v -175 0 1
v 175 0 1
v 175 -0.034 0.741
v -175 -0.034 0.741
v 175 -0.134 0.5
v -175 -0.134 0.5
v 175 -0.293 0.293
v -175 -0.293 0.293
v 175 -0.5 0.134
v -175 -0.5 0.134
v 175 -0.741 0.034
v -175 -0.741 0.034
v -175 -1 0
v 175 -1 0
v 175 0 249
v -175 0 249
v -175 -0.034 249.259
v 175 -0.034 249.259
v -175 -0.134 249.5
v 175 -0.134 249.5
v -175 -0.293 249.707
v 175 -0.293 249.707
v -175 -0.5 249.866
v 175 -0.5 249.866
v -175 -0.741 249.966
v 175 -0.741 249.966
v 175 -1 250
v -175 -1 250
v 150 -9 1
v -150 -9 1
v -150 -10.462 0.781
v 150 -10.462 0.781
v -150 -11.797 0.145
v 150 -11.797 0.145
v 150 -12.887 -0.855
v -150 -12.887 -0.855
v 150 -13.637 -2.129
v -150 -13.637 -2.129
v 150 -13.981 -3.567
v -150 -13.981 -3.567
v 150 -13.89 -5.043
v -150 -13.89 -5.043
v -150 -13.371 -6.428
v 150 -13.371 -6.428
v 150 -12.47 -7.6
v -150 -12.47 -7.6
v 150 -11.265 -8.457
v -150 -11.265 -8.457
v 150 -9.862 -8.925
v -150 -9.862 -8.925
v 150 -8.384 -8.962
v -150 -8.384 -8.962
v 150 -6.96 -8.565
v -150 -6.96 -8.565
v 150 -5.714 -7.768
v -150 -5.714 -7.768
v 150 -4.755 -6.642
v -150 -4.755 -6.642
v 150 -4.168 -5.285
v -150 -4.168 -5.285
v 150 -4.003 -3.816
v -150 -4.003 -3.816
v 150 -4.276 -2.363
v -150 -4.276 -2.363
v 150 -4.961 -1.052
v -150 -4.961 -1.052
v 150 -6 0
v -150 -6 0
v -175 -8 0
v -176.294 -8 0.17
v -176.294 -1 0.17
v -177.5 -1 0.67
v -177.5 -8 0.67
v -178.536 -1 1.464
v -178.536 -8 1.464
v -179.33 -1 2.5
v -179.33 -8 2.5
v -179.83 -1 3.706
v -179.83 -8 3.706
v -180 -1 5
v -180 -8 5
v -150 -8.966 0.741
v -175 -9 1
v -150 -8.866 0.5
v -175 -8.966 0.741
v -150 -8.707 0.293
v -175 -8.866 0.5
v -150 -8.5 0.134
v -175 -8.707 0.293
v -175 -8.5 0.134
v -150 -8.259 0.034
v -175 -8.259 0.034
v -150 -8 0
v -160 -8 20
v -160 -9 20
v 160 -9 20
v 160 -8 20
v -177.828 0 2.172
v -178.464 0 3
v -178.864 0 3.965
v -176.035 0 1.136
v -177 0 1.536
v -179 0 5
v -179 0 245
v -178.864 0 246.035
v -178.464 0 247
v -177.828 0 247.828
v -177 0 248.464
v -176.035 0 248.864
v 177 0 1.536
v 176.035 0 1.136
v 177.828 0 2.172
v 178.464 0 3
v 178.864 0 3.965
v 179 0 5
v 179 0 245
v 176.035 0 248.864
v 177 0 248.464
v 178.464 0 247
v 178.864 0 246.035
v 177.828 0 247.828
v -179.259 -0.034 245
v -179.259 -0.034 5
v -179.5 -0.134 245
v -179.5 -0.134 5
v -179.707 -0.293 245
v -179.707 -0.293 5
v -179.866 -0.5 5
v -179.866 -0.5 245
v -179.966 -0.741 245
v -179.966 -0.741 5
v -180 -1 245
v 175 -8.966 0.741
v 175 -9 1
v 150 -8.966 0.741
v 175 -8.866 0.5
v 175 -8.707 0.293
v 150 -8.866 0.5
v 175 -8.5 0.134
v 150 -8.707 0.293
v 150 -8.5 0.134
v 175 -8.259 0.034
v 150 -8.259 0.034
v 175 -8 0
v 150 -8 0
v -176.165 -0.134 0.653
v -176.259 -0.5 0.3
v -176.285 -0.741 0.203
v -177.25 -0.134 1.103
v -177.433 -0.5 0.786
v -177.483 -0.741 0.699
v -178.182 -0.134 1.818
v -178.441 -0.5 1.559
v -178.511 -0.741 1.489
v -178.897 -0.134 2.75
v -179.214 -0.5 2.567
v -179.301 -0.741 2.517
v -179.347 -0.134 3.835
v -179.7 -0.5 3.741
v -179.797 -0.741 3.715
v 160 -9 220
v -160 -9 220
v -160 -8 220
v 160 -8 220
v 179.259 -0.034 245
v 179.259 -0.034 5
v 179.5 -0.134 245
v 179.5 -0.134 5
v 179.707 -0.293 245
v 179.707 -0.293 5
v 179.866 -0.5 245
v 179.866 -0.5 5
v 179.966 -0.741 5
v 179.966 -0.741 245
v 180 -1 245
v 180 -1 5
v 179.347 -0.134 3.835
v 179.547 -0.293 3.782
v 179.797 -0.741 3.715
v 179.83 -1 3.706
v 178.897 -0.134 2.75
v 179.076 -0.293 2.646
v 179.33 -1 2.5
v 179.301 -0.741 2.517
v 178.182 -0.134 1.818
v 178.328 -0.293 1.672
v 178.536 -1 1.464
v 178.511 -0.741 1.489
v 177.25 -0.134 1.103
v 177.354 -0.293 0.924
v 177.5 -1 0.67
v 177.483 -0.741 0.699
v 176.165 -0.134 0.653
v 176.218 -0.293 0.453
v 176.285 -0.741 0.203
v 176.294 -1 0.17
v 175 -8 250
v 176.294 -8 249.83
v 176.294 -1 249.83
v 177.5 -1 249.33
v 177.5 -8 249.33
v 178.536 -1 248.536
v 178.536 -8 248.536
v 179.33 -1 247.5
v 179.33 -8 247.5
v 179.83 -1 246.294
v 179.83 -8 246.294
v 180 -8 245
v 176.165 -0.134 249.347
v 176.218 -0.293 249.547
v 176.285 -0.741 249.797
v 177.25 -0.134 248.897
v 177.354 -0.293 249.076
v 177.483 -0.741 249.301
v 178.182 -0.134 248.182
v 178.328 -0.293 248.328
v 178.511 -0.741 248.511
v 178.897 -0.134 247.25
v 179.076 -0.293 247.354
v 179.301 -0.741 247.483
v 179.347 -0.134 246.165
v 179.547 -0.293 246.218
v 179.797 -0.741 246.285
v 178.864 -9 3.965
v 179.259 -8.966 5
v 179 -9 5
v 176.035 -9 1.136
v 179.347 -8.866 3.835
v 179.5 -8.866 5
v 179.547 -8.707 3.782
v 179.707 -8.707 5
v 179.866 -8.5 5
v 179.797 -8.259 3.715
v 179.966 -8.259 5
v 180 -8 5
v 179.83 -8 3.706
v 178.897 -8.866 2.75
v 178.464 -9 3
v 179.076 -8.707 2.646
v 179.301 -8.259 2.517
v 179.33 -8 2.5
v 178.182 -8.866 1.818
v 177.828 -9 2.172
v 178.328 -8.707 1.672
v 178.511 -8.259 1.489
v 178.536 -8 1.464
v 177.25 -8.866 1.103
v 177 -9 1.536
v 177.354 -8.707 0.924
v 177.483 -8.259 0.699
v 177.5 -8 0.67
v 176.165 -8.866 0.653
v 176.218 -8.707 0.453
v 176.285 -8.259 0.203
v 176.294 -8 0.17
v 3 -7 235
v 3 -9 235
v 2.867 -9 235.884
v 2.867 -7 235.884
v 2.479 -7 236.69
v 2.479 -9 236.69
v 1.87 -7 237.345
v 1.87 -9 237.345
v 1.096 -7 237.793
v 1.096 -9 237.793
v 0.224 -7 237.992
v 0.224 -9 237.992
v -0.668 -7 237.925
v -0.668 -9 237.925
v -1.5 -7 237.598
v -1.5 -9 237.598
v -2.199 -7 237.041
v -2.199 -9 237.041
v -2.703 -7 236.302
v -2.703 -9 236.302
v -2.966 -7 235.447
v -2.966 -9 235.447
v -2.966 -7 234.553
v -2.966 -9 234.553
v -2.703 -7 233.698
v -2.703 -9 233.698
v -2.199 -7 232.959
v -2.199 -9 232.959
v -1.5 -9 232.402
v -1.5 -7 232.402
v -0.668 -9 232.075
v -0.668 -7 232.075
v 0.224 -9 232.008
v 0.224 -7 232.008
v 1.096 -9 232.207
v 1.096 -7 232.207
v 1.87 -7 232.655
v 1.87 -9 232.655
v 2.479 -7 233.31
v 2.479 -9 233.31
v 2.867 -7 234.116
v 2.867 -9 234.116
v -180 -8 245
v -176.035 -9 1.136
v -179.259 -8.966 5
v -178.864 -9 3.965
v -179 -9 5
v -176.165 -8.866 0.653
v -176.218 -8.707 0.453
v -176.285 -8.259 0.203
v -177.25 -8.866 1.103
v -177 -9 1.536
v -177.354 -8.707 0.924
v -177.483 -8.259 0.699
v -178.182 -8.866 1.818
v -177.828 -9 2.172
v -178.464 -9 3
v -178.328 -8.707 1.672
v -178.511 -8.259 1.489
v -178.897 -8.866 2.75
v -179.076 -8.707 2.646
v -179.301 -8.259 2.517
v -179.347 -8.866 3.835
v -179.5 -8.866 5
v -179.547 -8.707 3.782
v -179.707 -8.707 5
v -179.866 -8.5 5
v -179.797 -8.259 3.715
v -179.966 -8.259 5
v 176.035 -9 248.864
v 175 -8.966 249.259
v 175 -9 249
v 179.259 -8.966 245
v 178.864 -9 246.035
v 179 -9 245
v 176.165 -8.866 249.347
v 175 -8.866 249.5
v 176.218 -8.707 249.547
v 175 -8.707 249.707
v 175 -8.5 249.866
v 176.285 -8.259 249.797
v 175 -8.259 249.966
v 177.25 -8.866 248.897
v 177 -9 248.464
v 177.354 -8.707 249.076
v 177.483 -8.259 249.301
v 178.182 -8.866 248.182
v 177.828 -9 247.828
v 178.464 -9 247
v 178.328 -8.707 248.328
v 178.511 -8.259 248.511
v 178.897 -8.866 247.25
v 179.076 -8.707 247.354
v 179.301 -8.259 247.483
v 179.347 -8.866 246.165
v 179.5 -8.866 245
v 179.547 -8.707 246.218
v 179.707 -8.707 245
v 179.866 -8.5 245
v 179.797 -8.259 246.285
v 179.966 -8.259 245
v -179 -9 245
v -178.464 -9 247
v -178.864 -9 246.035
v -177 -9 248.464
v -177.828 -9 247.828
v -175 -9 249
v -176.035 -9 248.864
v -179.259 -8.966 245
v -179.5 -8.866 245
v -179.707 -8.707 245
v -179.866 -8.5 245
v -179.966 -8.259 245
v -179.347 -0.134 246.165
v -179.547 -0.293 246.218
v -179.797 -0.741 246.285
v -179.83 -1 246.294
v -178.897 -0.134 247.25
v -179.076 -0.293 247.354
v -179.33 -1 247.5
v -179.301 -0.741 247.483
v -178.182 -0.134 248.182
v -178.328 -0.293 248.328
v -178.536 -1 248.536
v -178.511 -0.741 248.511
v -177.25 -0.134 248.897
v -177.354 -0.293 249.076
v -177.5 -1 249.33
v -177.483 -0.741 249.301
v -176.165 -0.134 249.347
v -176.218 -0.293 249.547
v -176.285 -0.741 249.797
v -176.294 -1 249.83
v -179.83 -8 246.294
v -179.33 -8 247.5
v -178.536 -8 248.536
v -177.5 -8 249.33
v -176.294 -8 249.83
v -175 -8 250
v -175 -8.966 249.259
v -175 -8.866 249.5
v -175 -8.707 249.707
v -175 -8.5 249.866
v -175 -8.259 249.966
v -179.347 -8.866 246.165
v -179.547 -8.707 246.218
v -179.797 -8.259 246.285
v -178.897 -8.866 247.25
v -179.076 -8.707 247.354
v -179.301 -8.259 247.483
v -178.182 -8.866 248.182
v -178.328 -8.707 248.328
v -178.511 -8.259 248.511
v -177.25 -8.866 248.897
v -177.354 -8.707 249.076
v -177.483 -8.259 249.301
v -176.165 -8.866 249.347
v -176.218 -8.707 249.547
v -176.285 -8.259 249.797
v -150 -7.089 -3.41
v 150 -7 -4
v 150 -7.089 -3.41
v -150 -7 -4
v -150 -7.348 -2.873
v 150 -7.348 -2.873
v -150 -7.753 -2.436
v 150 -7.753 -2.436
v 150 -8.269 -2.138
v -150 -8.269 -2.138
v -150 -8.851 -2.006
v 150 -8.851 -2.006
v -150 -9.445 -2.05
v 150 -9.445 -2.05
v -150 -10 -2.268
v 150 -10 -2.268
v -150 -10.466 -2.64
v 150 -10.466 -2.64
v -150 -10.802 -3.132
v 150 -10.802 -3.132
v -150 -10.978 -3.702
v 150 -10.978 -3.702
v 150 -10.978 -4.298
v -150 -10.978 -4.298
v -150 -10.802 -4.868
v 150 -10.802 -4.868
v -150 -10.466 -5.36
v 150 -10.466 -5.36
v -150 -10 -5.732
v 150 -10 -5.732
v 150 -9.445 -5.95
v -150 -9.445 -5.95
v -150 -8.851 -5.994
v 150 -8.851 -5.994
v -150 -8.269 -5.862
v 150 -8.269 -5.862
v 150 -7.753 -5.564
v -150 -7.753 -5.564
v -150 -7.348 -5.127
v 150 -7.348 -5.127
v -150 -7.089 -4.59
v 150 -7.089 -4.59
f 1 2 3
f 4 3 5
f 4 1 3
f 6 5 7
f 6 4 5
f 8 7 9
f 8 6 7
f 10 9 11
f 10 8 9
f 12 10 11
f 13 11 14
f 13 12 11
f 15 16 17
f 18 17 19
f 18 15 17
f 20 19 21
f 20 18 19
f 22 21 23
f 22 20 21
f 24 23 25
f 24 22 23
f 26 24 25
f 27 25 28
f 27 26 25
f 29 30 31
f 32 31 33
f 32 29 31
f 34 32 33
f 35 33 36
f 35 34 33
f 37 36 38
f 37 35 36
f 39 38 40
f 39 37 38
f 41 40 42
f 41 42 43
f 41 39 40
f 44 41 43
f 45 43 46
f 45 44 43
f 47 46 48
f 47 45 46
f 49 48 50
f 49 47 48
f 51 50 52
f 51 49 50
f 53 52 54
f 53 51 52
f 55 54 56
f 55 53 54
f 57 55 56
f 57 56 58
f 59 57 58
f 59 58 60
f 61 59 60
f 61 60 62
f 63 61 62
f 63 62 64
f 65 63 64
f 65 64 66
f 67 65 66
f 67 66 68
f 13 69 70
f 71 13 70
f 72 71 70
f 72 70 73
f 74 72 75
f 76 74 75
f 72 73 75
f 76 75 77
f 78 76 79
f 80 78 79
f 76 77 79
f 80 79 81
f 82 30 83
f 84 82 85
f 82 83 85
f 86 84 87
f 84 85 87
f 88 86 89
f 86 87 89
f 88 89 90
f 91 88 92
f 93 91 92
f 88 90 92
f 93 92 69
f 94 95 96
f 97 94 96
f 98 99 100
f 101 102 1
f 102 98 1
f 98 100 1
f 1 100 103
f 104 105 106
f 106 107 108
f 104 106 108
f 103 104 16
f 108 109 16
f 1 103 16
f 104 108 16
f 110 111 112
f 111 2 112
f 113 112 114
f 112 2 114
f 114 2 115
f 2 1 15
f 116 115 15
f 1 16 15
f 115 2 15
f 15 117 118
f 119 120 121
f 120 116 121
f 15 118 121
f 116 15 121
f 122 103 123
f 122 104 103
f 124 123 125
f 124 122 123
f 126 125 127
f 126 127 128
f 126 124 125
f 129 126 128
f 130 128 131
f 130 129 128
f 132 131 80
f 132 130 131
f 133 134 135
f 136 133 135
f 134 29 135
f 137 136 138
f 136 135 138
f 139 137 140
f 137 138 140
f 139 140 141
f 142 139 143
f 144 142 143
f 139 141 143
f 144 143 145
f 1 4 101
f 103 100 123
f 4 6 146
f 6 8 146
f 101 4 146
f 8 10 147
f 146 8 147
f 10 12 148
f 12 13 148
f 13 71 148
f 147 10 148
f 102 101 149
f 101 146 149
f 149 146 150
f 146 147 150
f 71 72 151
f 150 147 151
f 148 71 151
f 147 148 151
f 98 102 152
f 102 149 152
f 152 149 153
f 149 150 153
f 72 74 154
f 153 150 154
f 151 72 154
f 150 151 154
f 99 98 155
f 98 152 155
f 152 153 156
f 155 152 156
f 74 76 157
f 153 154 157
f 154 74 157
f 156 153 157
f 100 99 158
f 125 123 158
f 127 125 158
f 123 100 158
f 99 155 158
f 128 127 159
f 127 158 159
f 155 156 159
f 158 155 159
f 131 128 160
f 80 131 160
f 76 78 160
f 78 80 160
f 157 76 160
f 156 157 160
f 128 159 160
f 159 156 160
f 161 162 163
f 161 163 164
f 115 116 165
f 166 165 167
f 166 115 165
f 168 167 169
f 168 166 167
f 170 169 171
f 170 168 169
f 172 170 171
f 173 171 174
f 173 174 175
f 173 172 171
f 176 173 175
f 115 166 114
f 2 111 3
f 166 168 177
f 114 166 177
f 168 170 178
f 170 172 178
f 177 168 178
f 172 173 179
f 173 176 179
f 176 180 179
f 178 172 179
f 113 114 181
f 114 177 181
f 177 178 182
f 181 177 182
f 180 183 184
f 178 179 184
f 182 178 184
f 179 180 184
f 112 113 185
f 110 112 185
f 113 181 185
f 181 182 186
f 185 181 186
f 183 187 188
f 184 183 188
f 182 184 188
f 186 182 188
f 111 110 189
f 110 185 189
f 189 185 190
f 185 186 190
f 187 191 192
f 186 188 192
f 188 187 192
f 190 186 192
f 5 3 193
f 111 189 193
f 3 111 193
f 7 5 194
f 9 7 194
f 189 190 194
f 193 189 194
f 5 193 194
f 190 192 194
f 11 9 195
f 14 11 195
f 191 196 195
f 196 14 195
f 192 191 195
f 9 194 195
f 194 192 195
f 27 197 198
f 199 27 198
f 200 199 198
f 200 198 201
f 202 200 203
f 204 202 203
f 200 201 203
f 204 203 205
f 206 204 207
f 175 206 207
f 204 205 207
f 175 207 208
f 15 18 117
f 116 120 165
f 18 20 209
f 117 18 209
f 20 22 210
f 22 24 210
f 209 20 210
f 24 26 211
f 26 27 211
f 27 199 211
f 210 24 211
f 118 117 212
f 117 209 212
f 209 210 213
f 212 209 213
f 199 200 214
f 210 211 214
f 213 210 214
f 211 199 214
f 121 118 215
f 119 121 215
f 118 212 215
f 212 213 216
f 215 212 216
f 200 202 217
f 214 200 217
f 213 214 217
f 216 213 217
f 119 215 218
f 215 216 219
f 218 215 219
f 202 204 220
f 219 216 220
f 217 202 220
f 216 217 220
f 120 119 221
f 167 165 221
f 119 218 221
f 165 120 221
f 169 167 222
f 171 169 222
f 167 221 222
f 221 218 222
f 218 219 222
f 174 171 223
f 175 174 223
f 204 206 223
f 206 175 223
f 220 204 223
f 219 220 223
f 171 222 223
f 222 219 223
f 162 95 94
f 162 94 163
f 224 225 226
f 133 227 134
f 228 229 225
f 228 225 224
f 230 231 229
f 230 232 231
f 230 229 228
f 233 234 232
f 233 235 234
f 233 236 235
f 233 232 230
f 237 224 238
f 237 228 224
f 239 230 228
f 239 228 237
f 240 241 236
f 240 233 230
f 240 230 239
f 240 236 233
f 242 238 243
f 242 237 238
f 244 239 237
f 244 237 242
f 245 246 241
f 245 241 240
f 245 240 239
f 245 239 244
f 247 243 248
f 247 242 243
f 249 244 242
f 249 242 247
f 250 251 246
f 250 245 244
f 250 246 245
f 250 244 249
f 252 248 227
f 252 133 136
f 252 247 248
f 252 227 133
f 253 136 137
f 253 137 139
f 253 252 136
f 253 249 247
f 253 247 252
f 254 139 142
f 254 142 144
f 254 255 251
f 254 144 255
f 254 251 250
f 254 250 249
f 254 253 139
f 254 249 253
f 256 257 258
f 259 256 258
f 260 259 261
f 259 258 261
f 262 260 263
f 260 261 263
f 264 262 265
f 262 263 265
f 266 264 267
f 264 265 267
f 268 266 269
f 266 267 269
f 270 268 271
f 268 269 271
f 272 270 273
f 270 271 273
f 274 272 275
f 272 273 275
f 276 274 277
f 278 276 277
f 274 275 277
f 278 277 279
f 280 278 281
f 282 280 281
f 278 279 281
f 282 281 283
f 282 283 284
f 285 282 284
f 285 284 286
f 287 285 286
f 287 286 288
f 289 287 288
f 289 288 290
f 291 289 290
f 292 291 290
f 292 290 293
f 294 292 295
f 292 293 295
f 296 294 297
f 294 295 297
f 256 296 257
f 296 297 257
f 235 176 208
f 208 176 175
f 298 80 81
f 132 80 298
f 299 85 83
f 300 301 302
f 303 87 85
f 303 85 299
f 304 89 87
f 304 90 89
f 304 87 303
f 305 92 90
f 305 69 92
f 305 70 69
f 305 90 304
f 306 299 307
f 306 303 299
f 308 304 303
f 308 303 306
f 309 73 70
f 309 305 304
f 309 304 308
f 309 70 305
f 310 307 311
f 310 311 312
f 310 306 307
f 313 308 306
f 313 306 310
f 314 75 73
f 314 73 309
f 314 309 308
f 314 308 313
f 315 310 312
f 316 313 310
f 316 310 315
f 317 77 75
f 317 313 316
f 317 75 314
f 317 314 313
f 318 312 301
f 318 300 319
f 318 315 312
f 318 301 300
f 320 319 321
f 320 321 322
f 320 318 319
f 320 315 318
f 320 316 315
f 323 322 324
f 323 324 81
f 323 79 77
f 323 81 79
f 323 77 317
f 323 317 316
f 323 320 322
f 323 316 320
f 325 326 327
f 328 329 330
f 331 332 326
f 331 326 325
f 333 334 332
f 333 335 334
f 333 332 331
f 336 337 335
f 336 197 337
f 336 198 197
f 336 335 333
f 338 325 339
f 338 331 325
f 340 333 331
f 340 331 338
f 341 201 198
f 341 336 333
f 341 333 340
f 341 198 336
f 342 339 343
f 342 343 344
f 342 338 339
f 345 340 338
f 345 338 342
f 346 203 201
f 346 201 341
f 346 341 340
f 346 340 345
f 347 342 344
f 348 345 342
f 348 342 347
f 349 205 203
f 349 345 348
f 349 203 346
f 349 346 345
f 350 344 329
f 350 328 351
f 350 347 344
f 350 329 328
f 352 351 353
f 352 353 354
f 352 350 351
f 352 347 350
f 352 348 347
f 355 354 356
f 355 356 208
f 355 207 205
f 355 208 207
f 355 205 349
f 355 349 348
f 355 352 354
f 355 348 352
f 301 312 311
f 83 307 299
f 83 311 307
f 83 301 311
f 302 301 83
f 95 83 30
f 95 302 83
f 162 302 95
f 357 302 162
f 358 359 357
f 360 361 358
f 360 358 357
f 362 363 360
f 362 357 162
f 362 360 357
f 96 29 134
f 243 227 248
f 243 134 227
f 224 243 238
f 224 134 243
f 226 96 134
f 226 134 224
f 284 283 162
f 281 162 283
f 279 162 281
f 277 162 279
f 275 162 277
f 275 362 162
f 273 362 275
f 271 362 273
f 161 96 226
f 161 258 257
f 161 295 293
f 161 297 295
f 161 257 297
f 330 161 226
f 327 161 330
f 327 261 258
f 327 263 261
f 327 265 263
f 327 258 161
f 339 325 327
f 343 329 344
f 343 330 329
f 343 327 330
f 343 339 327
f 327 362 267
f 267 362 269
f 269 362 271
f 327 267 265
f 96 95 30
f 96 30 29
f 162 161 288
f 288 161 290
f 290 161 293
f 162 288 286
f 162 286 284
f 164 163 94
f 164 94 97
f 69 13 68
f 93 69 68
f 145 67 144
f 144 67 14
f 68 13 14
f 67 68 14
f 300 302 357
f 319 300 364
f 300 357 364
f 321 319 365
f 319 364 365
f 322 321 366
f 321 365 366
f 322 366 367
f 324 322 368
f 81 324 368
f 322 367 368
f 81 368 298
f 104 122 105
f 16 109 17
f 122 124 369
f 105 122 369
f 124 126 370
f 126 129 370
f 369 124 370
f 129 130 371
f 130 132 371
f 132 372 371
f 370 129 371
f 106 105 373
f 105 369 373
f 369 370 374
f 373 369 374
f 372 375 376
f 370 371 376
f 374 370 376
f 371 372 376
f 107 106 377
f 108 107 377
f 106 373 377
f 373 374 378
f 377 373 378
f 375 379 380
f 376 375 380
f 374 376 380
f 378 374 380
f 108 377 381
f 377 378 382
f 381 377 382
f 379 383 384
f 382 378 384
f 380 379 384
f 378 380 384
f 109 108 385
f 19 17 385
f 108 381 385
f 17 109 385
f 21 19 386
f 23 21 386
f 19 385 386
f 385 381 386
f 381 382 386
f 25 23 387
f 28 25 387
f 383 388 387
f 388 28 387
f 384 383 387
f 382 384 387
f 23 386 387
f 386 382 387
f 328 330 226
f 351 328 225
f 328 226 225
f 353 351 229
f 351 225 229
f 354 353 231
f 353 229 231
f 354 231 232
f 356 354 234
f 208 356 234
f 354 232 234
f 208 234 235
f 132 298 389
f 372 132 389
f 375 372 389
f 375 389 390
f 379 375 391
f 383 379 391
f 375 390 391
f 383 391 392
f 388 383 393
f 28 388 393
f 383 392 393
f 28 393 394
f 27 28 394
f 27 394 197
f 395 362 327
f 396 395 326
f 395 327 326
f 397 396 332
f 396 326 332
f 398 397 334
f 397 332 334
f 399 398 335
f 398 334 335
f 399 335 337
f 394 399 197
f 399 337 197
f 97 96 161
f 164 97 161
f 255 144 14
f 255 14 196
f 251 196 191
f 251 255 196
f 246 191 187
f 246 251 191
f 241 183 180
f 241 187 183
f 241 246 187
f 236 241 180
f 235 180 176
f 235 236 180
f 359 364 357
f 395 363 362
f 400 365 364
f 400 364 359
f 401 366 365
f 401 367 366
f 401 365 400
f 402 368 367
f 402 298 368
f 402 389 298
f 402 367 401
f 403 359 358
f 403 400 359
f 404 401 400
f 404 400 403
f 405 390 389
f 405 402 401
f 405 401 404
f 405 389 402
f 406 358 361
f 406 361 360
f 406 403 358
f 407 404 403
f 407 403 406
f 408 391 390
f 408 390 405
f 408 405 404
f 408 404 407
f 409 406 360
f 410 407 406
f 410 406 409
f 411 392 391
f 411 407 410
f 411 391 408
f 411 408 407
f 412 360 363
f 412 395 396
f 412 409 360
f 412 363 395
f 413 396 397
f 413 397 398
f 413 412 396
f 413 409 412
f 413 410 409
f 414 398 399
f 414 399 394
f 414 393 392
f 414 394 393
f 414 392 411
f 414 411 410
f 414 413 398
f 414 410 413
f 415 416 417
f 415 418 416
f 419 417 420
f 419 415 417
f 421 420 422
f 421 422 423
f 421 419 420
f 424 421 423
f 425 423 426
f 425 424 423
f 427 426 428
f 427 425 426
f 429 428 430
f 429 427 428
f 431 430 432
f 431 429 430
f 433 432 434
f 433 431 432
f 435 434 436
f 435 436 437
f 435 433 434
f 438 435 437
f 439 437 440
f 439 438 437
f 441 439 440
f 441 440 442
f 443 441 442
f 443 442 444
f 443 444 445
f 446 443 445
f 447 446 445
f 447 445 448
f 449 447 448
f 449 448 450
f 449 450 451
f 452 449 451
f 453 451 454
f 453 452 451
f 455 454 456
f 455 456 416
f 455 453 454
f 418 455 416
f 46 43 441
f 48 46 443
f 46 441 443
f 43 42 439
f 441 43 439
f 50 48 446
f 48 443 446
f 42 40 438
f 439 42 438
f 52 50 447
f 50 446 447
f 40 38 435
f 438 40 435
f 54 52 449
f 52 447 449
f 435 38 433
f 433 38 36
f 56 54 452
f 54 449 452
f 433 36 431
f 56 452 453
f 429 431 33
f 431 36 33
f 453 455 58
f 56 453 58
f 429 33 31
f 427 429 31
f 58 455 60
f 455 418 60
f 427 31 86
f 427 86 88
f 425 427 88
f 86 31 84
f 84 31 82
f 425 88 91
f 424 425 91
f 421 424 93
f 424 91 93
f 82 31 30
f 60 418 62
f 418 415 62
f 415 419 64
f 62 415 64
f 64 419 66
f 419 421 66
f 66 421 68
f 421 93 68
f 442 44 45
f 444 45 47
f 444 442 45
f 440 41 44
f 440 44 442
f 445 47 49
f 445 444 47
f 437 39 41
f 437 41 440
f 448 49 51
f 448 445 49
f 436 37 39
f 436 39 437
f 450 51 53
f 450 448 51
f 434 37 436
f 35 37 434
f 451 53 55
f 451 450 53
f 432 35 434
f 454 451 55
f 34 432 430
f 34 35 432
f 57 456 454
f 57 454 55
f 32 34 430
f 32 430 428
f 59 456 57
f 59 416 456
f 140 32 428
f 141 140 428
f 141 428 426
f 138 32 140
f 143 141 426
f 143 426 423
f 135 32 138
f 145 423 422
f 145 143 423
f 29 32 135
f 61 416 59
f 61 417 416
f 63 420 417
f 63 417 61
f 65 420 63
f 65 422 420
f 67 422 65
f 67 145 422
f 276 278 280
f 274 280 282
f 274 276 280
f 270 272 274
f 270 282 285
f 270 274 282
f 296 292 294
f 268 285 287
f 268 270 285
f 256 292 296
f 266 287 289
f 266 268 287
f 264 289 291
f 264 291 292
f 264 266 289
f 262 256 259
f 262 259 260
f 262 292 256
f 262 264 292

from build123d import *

# Parameters (mm, degrees)
F0_W     = 360
F0_H     = 250
F1_DEPTH = 9
F2_W     = 320
F2_H     = 200
F3_DEPTH = 1
F4_R     = 3
F5_DEPTH = 2
F6_R     = 5
F6_R_2   = 2
F7_DEPTH = 150
F8_R     = 5
F9_R     = 1


with BuildPart() as f1:
    # F0 (on Front) → F1 (new body)
    with BuildSketch(Plane.XZ):
        with Locations((0, 125)):
            Rectangle(F0_W, F0_H)
    extrude(amount=F1_DEPTH)

    # F2 (on face) → F3 (cut)
    with BuildSketch(Plane.XZ.offset(9)):
        with Locations((0, 120)):
            Rectangle(F2_W, F2_H)
    extrude(amount=-F3_DEPTH, mode=Mode.SUBTRACT)

    # F4 (on face) → F5 (cut)
    with BuildSketch(Plane.XZ.offset(9)):
        with Locations((0, 235)):
            Circle(F4_R)
    extrude(amount=-F5_DEPTH, mode=Mode.SUBTRACT)

    # F6 (on Right) → F7 (join, symmetric)
    with BuildSketch(Plane.YZ):
        with Locations((-9, -4)):
            Circle(F6_R)
        with Locations((-9, -4)):
            Circle(F6_R_2, mode=Mode.SUBTRACT)
    extrude(amount=F7_DEPTH, both=True)

    # F8
    f8_edges = [f1.edges().sort_by_distance(p)[0] for p in [
        (180, -4.5, 0),
        (180, -4.5, 250),
        (-180, -4.5, 250),
        (-180, -4.5, 0),
    ]]
    fillet(f8_edges, radius=F8_R)

    # F9
    f9_edges = [f1.edges().sort_by_distance(p)[0] for p in [
        (-180, -9, 125),
        (-180, 0, 125),
    ]]
    fillet(f9_edges, radius=F9_R)


solid = f1.part
